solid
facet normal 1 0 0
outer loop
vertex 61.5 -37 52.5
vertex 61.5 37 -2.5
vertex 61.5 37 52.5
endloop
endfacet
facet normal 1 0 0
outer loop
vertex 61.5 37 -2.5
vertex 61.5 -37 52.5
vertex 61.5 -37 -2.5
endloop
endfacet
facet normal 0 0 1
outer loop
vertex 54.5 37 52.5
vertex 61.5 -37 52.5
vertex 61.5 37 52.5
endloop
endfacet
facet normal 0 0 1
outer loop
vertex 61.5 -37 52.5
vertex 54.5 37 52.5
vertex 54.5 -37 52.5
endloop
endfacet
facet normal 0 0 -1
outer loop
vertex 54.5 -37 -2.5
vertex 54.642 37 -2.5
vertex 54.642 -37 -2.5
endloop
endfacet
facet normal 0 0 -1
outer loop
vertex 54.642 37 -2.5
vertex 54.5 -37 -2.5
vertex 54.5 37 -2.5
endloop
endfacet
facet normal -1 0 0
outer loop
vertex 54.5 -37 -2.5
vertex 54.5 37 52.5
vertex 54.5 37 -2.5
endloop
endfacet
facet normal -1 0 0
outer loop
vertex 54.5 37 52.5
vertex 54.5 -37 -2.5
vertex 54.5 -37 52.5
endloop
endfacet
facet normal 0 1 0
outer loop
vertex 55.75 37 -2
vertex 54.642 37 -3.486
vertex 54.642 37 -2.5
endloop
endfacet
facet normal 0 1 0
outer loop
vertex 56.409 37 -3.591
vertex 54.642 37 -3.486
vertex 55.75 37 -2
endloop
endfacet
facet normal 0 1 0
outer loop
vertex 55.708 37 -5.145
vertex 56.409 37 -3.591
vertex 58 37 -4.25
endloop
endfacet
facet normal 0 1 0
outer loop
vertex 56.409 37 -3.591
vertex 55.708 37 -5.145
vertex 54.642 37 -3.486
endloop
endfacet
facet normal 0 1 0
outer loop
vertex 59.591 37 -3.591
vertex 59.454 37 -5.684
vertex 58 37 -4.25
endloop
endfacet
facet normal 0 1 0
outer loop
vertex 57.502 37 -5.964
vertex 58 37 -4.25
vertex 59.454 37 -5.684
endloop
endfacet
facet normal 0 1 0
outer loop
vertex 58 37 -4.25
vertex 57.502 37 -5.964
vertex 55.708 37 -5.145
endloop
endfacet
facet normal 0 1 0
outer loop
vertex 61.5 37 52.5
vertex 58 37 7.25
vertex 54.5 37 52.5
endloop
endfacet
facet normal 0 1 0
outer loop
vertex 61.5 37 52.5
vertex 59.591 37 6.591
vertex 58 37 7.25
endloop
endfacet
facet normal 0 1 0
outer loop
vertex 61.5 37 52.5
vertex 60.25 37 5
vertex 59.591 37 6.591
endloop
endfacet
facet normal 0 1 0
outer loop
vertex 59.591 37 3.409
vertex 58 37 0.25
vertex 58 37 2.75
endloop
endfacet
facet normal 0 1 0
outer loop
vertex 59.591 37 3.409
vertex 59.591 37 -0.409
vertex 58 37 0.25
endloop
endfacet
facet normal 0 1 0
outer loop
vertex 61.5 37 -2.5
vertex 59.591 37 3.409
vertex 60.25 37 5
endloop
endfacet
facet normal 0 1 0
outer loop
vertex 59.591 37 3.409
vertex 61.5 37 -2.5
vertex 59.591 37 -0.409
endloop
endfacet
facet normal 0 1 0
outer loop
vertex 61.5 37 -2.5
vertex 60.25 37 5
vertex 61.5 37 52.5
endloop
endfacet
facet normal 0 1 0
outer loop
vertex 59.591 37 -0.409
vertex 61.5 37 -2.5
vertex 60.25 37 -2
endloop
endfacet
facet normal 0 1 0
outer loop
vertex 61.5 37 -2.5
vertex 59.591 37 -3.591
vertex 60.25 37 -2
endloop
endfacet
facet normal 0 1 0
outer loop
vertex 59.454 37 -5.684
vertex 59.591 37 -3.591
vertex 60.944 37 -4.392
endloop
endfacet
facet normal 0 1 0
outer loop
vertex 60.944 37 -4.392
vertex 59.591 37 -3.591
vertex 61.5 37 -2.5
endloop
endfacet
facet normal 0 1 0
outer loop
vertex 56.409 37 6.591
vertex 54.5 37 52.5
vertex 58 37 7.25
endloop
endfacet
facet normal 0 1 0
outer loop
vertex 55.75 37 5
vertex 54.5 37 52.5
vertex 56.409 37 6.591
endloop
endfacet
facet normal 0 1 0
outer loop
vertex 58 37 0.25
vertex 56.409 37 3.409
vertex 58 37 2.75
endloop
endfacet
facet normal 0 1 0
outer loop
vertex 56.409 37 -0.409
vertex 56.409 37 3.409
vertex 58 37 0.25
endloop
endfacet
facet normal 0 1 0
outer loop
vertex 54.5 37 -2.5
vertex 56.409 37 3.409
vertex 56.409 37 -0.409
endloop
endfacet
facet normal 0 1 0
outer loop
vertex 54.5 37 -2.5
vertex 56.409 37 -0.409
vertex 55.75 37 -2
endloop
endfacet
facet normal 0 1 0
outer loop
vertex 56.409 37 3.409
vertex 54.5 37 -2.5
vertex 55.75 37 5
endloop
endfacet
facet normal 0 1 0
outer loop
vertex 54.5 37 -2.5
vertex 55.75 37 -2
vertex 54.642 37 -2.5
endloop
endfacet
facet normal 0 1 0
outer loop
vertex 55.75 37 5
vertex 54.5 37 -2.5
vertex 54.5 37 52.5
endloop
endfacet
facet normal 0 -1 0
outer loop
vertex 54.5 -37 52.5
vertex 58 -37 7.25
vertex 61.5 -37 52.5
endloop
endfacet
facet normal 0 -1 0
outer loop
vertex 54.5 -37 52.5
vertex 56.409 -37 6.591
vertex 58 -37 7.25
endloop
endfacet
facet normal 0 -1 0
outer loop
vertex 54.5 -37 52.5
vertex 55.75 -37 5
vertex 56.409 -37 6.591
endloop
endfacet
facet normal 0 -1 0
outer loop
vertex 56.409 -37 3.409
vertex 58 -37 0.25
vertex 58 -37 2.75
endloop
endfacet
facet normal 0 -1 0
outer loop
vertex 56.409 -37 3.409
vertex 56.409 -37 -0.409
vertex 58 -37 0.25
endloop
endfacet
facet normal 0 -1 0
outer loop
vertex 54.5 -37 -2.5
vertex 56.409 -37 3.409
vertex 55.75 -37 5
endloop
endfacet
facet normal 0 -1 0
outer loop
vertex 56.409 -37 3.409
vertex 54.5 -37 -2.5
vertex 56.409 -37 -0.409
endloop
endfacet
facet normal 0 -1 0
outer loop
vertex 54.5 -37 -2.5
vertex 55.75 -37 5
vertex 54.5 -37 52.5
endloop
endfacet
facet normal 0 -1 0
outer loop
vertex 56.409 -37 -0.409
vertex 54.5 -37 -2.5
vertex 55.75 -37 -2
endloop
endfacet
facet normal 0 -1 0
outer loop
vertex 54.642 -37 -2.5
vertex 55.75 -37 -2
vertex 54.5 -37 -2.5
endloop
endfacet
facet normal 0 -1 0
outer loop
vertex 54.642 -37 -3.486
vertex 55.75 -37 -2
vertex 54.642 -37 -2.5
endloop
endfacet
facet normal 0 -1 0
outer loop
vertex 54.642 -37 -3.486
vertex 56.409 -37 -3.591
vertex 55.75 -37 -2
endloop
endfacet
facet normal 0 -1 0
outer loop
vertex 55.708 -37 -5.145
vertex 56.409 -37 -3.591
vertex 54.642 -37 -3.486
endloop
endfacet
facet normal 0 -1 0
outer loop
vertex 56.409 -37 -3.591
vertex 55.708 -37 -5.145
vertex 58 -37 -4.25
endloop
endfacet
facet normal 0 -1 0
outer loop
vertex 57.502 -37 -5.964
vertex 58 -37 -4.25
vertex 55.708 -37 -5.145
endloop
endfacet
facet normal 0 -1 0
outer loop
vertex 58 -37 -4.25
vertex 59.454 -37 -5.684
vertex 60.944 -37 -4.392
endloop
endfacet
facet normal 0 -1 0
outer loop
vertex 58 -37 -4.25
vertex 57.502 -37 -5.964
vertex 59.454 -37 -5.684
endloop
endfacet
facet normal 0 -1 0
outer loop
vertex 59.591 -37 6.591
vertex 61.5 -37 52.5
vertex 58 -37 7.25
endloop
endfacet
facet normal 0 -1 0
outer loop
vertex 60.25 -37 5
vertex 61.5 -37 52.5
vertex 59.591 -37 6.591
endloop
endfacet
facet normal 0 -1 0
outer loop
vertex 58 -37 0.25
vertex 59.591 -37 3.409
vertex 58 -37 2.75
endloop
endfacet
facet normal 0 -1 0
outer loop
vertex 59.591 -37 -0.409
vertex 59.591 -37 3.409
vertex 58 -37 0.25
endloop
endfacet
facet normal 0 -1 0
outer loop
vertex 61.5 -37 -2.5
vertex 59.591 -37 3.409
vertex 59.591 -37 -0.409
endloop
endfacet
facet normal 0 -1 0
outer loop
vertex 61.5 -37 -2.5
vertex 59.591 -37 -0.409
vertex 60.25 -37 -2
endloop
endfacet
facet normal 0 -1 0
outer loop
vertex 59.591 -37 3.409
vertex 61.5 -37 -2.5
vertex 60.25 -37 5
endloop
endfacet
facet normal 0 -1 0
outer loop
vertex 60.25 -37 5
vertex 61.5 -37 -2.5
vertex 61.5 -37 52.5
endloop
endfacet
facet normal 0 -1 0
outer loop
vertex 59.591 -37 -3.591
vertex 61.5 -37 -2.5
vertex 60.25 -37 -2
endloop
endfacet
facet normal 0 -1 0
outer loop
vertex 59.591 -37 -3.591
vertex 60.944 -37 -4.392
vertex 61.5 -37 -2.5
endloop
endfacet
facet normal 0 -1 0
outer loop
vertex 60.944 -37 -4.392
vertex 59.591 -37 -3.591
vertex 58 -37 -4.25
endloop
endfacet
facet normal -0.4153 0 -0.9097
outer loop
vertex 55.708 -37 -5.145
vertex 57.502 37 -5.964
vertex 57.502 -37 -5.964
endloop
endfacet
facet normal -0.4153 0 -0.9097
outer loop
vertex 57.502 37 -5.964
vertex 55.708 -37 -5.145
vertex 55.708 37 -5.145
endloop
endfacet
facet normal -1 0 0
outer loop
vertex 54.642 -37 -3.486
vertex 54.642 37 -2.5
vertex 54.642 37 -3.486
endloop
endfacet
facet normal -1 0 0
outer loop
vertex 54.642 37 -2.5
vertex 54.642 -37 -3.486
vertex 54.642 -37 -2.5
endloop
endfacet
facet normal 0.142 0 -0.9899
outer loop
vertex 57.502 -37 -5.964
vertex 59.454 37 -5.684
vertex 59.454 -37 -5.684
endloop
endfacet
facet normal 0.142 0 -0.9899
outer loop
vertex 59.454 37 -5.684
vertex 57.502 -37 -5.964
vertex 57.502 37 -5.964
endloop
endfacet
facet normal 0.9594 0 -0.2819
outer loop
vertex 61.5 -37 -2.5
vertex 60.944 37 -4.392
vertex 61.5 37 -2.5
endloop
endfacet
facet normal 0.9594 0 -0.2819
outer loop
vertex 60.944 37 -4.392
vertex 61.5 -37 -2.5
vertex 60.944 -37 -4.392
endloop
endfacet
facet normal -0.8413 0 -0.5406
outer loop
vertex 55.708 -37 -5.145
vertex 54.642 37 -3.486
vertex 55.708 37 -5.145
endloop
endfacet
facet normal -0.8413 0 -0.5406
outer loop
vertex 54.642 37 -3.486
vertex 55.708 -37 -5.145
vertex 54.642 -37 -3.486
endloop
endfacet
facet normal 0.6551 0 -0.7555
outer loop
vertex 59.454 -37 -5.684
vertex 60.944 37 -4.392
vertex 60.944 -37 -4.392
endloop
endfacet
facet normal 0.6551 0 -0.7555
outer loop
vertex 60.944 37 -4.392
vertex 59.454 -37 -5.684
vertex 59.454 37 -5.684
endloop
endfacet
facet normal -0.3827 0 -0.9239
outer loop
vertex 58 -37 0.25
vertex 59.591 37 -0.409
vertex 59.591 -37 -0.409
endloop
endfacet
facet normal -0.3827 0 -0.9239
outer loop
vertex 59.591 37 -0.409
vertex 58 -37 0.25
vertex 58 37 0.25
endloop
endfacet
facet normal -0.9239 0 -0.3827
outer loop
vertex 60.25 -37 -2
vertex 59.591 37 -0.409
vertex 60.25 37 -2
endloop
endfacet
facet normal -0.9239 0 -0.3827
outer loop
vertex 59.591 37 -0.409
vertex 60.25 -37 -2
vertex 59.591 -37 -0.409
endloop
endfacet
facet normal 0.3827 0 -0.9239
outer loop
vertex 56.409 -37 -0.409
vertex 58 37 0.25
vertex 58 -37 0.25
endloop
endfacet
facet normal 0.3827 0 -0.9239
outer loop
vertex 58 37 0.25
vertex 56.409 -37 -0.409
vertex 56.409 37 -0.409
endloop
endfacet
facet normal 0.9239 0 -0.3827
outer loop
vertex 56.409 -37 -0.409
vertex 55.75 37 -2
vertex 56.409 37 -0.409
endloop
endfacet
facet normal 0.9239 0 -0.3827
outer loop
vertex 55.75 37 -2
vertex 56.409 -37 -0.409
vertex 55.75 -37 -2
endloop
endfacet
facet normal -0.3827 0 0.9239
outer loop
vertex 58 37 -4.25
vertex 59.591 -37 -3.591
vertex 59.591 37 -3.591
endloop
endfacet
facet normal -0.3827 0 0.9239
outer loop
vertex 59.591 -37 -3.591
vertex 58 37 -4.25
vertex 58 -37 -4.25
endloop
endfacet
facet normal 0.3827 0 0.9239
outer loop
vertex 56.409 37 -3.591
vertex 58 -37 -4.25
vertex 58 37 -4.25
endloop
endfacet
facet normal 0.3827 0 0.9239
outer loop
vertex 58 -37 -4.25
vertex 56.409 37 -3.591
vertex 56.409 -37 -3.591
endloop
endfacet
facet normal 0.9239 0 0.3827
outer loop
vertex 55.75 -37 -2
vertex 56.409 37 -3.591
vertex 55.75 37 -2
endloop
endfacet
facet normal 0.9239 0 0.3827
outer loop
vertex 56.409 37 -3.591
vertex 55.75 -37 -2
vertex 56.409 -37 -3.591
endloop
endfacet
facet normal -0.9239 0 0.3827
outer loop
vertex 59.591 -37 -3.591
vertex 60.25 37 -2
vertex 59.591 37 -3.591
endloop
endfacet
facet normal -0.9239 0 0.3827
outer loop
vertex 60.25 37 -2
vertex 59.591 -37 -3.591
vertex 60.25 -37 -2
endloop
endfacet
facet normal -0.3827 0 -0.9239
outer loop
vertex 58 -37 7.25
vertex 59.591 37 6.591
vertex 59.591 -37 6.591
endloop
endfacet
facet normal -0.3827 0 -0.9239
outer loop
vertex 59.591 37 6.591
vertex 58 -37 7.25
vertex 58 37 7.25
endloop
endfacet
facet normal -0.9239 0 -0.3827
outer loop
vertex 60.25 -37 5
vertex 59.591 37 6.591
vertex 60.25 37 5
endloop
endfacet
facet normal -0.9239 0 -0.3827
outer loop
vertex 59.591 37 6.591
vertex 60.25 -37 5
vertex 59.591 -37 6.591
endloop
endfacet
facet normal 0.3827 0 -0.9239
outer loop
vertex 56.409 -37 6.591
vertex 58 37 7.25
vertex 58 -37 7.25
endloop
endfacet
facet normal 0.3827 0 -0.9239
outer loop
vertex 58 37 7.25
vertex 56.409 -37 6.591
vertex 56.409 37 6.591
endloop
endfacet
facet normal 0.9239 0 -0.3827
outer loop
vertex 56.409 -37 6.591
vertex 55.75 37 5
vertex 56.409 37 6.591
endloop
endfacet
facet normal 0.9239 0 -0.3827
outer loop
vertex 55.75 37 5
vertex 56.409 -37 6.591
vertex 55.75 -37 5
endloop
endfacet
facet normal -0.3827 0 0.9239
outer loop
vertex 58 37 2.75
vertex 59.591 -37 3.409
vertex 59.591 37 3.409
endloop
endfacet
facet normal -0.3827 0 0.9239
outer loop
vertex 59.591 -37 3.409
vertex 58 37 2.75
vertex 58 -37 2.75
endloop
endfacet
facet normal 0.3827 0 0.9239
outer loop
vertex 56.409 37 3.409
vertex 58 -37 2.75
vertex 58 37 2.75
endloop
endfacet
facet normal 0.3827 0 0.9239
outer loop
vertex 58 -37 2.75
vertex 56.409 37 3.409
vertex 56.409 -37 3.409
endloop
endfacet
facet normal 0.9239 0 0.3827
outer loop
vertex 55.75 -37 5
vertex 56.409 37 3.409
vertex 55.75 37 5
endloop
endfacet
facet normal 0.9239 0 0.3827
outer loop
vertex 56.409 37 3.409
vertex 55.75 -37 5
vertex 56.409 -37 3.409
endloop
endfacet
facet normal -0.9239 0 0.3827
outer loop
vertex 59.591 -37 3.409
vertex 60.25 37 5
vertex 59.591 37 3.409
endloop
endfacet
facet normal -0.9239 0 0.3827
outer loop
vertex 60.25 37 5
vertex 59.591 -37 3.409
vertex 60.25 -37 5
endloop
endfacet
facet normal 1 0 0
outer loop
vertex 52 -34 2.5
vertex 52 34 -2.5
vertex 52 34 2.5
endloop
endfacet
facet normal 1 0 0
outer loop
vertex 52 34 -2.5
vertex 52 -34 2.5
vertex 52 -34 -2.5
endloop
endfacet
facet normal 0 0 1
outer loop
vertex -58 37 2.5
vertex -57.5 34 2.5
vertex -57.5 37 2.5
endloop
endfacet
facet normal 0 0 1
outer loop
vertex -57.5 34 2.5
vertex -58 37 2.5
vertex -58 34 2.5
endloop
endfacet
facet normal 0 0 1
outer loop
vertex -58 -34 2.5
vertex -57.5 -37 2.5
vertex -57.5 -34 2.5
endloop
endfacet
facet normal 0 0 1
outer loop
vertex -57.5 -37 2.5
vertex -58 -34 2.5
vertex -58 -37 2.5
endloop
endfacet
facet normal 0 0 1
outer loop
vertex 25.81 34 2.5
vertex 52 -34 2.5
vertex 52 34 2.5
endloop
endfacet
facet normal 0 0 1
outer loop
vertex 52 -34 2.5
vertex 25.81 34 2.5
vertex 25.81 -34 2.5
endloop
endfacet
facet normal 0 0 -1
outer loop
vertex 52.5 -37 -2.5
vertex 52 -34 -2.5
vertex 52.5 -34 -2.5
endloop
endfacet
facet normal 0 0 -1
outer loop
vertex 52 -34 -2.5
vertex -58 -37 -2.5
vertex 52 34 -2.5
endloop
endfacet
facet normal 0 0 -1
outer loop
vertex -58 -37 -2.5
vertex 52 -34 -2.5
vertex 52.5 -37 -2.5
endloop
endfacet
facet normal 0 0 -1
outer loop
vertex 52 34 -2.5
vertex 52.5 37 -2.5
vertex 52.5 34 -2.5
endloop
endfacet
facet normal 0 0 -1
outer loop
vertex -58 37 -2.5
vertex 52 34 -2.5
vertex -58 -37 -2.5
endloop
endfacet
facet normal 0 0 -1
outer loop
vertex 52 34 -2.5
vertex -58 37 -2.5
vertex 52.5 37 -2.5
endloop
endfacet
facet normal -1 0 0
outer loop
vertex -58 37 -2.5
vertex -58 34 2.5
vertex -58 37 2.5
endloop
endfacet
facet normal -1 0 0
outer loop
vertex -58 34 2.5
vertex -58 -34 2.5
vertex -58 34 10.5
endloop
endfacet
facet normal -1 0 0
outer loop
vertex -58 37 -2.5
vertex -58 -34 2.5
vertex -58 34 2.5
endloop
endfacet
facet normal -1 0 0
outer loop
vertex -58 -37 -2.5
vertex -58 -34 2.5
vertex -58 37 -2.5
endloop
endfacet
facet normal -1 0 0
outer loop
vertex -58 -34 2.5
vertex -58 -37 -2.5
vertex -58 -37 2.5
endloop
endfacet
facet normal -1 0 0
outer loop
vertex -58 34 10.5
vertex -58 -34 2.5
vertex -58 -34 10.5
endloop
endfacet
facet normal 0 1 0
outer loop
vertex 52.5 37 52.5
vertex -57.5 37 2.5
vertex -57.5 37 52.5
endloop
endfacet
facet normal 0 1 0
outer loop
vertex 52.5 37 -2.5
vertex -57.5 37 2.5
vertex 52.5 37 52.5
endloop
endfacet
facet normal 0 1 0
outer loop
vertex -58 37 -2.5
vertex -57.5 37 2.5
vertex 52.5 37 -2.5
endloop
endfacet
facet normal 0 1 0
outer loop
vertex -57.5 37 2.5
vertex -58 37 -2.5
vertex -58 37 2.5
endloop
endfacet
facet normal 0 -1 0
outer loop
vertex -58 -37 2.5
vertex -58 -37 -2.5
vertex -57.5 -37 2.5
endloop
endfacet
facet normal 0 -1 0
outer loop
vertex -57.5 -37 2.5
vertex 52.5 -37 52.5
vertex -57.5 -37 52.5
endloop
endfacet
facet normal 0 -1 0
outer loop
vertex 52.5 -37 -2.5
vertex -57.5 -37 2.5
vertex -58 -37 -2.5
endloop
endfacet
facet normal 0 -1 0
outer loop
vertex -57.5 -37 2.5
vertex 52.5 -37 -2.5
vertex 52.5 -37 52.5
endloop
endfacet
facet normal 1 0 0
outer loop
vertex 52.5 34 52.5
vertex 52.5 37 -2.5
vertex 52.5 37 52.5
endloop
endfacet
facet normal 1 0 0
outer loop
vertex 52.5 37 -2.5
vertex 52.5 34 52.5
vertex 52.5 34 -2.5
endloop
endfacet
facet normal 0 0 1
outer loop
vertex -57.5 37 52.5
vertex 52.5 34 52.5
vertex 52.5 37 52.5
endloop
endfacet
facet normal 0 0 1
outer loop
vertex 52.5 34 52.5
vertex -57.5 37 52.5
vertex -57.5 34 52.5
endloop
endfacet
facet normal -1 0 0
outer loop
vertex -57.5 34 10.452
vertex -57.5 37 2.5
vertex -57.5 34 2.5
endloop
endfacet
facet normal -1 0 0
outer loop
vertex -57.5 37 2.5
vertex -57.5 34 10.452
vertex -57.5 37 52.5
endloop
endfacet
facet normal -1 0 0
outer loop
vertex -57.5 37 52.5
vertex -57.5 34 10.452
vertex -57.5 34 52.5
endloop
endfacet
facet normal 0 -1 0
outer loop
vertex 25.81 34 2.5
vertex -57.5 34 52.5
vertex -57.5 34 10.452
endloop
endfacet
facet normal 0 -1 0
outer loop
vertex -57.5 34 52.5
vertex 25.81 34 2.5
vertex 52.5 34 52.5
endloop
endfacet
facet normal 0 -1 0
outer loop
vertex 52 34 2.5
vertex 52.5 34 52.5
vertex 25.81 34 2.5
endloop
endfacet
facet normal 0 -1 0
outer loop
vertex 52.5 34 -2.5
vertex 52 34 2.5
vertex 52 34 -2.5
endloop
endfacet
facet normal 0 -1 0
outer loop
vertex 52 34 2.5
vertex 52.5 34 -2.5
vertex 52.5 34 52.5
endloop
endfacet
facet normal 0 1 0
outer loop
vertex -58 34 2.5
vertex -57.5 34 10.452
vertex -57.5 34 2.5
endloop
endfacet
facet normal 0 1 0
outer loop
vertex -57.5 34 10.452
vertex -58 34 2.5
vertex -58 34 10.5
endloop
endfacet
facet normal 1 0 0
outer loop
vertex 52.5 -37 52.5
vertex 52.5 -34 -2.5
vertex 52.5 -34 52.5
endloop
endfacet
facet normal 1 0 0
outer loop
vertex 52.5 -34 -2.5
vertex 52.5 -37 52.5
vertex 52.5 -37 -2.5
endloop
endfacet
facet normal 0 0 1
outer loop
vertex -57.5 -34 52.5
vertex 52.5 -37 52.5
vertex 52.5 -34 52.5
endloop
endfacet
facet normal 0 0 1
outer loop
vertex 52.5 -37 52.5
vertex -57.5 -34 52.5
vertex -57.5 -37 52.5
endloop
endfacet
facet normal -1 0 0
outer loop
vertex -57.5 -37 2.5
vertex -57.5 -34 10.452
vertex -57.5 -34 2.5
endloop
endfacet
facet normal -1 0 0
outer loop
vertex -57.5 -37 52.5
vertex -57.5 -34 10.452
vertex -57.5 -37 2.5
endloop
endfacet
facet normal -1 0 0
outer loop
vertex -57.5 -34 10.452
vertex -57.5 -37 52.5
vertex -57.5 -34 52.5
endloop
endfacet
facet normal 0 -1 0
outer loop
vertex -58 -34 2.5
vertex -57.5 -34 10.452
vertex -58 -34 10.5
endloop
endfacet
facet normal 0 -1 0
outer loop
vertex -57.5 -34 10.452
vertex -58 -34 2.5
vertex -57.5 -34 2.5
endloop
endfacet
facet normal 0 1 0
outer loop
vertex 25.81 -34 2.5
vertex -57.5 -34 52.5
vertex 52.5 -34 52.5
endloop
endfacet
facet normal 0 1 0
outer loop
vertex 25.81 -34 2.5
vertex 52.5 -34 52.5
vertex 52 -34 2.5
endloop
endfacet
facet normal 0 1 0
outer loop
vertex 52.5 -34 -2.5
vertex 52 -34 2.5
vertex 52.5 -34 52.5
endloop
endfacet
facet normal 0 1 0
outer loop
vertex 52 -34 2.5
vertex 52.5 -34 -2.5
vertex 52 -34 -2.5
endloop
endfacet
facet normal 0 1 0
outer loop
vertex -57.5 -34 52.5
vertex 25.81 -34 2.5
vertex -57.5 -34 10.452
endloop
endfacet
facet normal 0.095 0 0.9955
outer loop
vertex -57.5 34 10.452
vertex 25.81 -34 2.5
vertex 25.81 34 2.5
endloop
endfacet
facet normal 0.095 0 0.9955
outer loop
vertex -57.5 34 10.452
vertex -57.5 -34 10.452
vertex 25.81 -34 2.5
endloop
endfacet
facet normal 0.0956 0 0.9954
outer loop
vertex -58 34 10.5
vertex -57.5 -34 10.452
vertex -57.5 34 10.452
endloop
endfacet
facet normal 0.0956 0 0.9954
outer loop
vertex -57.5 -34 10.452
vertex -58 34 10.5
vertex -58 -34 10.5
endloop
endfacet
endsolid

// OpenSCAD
//base of dump
//rotate([0,15,0]) {
translate ([-3,0,0]) {
    cube([110,74,5],center = true);
}

translate([-2.5,35.5,25]) {
    cube([110,3,55], center = true);
}

translate([-2.5,-35.5,25]) {
    cube([110,3,55], center = true);
}

//movable wall
translate([58,0,25]) {
    difference() {
        union() {
            cube([7,74,55], center = true);
            translate ([0,0,-27.5]) {
                rotate([90,0,0]) {
                    cylinder(74,r = 3.5,center = true);
                }
            }
        }
        translate ([0,0,-27]) {
            rotate([90,0,0]) {
                cylinder(74,r = 2.25,center = true);
            }
        }
        translate ([0,0,-20]) {
            rotate([90,0,0]) {
                cylinder(74,r = 2.25,center = true);
            }
        }
    }
}

//Draw a prism based on a 
//right angled triangle
//l - length of prism
//w - width of triangle
//h - height of triangle
module prism(l, w, h) {
       polyhedron(points=[
               [0,0,h],           // 0    front top corner
               [0,0,0],[w,0,0],   // 1, 2 front left & right bottom corners
               [0,l,h],           // 3    back top corner
               [0,l,0],[w,l,0]    // 4, 5 back left & right bottom corners
       ], faces=[ // points for all faces must be ordered clockwise when looking in
               [0,2,1],    // top face
               [3,4,5],    // base face
               [0,1,4,3],  // h face
               [1,2,5,4],  // w face
               [0,3,5,2],  // hypotenuse face
       ]);
}

translate([-58, -34,0]){prism(68, 110, 10.5);} //draw slant at angle of 5 deg
